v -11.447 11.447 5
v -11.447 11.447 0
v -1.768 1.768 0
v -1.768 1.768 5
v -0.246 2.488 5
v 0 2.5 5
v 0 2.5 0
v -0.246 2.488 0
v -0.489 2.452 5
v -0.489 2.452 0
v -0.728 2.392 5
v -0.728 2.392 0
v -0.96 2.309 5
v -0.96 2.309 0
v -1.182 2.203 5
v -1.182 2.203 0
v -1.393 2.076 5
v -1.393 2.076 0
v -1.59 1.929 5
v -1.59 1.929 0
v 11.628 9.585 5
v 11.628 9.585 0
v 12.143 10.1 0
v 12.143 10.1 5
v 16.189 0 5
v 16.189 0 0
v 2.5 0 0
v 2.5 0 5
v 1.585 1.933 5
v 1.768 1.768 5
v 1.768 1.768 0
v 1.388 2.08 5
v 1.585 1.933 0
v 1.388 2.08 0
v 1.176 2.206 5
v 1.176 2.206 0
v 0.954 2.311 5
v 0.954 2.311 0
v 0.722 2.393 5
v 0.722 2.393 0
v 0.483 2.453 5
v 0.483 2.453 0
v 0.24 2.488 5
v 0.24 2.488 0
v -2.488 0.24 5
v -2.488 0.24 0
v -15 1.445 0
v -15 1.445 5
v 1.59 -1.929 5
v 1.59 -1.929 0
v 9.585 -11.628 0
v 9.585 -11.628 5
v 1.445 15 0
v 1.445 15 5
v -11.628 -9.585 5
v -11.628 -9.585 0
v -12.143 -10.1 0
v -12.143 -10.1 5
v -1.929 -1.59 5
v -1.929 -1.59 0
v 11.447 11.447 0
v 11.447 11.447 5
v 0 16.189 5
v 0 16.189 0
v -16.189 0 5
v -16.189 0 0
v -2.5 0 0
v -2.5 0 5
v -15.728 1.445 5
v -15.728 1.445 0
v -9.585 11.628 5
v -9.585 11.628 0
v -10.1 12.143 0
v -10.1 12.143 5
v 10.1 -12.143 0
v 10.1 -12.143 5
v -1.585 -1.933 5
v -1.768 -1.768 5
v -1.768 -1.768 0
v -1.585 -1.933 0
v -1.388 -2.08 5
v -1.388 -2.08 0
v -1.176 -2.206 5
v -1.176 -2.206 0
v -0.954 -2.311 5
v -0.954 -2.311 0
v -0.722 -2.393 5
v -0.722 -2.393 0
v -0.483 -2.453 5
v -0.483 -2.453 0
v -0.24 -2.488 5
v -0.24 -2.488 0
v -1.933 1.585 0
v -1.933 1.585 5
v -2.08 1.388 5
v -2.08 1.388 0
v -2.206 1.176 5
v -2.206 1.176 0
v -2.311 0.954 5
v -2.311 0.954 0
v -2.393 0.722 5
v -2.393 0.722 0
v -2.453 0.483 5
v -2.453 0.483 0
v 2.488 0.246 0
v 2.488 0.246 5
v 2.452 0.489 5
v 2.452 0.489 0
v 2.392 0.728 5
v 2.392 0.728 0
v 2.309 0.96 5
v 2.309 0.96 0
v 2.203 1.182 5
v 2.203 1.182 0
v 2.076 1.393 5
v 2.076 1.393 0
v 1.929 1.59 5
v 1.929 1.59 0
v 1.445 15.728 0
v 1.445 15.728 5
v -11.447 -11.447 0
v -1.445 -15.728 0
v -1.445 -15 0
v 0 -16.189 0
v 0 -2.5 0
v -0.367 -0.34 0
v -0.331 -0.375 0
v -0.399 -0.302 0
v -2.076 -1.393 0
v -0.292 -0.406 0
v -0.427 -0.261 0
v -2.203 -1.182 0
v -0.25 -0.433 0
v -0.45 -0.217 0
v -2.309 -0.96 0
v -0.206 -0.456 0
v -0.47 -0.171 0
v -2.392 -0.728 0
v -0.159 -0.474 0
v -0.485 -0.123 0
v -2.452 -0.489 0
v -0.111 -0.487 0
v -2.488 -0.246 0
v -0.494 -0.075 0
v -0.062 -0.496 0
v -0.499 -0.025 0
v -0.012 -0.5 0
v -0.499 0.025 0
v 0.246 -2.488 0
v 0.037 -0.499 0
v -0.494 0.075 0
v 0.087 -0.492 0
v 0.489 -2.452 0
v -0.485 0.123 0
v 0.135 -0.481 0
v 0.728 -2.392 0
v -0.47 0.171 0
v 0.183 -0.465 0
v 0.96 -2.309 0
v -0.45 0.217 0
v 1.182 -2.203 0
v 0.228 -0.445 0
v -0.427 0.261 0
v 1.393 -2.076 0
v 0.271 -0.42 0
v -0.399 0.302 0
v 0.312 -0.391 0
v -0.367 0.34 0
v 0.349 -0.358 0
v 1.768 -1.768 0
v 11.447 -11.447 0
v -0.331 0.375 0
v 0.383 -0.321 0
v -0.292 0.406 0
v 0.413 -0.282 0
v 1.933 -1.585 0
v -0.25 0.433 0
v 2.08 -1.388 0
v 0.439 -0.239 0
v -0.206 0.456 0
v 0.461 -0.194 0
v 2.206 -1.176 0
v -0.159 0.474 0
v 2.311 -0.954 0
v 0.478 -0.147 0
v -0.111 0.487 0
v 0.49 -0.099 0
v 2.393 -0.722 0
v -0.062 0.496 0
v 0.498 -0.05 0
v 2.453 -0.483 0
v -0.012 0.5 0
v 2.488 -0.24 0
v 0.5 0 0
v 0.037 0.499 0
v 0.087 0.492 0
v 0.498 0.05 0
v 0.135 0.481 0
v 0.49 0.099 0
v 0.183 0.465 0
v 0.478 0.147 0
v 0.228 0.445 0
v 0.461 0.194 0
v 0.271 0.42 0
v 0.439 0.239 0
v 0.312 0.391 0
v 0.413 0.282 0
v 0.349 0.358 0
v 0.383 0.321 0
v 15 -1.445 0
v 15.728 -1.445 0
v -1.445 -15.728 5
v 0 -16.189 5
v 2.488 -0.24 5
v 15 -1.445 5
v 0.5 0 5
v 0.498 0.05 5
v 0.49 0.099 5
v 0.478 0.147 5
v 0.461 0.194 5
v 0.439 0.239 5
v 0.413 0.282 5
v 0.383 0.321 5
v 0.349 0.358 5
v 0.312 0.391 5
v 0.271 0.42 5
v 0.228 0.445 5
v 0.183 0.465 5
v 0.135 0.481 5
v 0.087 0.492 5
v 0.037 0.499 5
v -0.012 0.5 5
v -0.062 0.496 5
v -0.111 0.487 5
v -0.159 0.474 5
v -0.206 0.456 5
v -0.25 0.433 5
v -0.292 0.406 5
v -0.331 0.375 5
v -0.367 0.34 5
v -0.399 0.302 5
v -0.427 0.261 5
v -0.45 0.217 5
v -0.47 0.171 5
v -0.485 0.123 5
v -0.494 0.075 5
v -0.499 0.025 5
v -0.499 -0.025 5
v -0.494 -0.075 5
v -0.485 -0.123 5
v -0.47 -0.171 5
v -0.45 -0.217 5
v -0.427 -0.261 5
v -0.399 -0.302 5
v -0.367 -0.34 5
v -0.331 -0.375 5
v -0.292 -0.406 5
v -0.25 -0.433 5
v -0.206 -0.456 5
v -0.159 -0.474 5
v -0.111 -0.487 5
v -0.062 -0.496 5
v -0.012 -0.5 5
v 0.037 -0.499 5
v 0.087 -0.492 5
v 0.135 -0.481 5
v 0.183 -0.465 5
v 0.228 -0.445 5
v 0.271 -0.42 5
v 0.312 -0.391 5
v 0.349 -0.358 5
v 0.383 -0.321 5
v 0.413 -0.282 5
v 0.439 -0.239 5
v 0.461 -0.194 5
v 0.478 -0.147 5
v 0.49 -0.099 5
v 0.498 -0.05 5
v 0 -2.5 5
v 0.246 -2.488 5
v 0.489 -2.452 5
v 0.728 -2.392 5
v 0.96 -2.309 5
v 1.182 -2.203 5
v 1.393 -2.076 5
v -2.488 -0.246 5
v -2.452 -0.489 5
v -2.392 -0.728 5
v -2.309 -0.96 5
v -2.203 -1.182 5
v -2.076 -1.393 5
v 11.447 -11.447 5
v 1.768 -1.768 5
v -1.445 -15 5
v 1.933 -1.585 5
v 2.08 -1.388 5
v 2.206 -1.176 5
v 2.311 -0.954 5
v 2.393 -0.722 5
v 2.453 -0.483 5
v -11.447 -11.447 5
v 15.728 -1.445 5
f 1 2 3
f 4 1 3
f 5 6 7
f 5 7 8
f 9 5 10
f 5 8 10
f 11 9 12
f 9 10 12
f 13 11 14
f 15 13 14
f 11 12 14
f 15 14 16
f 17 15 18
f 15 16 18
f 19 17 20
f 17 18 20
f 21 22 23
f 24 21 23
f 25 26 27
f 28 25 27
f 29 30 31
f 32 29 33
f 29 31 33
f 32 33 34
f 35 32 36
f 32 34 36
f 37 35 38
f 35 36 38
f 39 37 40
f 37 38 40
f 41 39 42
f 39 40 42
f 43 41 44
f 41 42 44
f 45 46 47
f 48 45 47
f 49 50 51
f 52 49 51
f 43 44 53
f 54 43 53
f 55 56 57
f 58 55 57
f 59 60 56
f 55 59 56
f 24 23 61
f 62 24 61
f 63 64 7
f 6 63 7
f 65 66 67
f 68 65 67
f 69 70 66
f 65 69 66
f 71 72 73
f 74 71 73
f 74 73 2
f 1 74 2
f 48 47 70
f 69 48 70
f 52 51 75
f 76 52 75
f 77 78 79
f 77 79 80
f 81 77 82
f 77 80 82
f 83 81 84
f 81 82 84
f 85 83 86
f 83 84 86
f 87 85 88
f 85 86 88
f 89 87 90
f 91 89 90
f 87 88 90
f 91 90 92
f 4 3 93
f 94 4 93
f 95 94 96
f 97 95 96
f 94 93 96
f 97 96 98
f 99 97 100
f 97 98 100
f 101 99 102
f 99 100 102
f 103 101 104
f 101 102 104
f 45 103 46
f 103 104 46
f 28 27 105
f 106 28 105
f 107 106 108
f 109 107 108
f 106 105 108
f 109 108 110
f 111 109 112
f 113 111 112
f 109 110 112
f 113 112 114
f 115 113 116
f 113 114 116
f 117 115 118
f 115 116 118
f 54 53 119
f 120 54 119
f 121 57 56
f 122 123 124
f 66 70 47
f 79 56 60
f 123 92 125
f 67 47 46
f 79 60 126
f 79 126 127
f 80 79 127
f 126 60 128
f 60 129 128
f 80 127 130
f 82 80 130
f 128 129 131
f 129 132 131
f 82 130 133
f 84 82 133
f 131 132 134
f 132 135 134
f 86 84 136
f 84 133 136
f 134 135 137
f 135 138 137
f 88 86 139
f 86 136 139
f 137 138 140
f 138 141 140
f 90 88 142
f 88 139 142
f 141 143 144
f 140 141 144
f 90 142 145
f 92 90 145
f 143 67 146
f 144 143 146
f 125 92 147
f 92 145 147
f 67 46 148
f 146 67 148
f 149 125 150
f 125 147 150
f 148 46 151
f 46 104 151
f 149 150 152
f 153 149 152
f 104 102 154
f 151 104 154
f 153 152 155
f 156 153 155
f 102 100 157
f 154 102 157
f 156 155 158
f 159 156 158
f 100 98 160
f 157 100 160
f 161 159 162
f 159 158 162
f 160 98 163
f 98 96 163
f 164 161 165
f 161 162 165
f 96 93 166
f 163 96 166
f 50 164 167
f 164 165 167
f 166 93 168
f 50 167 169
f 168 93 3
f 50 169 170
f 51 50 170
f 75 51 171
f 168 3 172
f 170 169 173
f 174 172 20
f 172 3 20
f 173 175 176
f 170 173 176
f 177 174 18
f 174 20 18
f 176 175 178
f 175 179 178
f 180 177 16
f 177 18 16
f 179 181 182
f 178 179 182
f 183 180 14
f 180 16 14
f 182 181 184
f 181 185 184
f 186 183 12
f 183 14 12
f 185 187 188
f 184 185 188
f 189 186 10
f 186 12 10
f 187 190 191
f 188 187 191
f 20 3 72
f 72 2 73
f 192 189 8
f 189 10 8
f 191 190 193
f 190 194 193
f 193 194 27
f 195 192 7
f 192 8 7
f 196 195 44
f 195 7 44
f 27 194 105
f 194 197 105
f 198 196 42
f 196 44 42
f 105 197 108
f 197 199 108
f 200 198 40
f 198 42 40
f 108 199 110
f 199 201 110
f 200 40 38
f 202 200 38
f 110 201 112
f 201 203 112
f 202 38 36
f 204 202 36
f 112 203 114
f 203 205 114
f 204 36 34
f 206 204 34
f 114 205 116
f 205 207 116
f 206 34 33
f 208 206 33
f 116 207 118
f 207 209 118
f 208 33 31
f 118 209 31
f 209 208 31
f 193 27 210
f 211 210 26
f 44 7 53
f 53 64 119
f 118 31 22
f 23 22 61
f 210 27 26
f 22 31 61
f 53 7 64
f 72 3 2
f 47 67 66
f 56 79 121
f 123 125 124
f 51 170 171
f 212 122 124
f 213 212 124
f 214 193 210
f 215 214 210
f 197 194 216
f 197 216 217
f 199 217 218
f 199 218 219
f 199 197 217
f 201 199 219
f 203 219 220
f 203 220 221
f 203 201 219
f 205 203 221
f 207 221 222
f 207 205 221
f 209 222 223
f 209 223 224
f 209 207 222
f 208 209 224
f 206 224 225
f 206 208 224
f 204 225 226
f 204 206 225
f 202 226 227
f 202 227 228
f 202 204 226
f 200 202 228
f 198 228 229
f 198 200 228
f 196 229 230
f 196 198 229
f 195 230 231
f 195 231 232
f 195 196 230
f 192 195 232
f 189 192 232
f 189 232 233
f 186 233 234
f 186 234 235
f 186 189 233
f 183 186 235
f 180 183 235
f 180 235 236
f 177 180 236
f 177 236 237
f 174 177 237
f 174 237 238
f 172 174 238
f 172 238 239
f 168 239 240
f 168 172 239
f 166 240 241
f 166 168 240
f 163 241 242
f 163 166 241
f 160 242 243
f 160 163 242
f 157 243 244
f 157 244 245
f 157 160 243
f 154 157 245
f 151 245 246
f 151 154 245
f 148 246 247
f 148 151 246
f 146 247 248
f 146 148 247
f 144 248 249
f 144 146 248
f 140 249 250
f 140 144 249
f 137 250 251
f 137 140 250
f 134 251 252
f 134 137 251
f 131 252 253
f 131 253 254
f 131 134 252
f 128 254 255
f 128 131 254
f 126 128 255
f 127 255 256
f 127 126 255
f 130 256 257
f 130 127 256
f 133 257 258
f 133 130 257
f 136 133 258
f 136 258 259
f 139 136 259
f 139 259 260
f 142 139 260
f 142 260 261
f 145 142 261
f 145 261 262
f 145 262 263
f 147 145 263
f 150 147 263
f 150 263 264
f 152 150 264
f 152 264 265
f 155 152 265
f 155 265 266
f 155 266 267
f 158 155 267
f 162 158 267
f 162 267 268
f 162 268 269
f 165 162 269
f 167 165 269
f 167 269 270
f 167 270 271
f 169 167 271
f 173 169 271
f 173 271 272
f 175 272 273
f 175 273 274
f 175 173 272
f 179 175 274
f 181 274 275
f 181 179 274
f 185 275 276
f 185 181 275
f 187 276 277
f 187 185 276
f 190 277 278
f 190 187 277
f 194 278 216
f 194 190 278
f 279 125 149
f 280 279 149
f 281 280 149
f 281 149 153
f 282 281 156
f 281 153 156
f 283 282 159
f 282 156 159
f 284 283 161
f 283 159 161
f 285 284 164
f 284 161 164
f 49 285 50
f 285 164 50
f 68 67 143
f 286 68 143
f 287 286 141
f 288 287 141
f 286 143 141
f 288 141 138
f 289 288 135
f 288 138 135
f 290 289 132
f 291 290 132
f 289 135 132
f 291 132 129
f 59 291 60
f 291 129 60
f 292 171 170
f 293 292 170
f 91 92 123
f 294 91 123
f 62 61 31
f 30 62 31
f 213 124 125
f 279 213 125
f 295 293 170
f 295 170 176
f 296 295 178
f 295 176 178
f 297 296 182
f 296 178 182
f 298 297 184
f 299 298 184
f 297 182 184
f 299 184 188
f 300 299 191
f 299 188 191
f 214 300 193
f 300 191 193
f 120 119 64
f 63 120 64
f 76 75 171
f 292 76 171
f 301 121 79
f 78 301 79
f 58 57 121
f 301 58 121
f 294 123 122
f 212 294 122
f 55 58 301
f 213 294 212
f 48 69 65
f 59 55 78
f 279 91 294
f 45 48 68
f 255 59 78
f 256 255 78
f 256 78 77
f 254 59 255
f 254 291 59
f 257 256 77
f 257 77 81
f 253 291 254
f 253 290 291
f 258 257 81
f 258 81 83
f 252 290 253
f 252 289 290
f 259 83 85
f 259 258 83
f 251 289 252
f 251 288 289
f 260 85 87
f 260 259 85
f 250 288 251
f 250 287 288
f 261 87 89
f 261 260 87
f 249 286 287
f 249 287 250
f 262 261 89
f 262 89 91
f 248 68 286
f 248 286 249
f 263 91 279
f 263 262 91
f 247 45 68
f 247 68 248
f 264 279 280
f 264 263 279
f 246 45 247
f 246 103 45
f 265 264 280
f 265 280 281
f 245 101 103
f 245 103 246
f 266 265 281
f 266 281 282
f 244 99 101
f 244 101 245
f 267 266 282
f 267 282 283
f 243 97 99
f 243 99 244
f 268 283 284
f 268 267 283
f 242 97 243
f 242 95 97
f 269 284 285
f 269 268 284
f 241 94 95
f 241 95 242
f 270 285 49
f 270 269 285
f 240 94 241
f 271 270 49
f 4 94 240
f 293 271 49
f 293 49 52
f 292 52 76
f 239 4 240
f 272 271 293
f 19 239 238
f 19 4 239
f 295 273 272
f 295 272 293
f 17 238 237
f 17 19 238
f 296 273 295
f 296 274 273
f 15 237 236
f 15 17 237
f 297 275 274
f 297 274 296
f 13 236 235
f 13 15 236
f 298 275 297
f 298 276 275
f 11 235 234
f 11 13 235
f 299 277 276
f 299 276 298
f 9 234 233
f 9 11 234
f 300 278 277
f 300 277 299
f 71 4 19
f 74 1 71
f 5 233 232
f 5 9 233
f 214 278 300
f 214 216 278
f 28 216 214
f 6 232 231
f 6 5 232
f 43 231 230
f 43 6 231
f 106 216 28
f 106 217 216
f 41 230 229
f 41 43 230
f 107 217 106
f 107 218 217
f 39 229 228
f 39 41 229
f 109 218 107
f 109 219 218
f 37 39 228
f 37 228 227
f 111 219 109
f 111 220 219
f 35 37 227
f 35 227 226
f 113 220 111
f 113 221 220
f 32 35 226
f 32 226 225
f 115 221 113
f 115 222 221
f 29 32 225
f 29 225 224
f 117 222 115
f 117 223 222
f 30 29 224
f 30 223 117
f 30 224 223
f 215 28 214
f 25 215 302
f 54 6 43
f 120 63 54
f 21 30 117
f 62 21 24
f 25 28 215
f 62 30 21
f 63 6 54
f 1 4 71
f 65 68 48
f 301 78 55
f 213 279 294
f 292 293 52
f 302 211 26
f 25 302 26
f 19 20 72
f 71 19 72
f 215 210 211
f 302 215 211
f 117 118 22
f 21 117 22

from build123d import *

# Parameters (mm, degrees)
F0_R     = 2.5
F0_R_2   = 0.5
F1_DEPTH = 5
F3_DEPTH = 5


with BuildPart() as f1:
    # F0 (on Top) → F1 (new body)
    with BuildSketch(Plane.XY):
        Circle(F0_R)
        Circle(F0_R_2, mode=Mode.SUBTRACT)
    extrude(amount=F1_DEPTH)

    # F2 (on Top) → F3 (join)
    with BuildSketch(Plane.XY):
        with BuildLine():
            ThreePointArc((-0.981539, 0.981539), (-0.933303, 1.027514), (-0.882916, 1.07112))
            Line((-0.882916, 1.07112), (-9.58502, 11.628184))
            Line((-9.58502, 11.628184), (-10.099932, 12.143096))
            Line((-10.099932, 12.143096), (-11.447009, 11.447009))
            Line((-11.447009, 11.447009), (-10.606602, 10.606602))
            Line((-10.606602, 10.606602), (-0.981539, 0.981539))
        make_face()
        with BuildLine():
            Line((0, 15), (0, 1.388106))
            ThreePointArc((0, 1.388106), (0.066617, 1.386507), (0.133081, 1.381712))
            Line((0.133081, 1.381712), (1.444735, 15))
            Line((1.444735, 15), (1.444735, 15.728196))
            Line((1.444735, 15.728196), (0, 16.188515))
            Line((0, 16.188515), (0, 15))
        make_face()
        with BuildLine():
            Line((10.606602, 10.606602), (0.981539, 0.981539))
            ThreePointArc((0.981539, 0.981539), (1.027514, 0.933303), (1.07112, 0.882916))
            Line((1.07112, 0.882916), (11.628184, 9.58502))
            Line((11.628184, 9.58502), (12.143096, 10.099932))
            Line((12.143096, 10.099932), (11.447009, 11.447009))
            Line((11.447009, 11.447009), (10.606602, 10.606602))
        make_face()
        with BuildLine():
            Line((15, 0), (1.388106, 0))
            ThreePointArc((1.388106, 0), (1.386507, -0.066617), (1.381712, -0.133081))
            Line((1.381712, -0.133081), (15, -1.444735))
            Line((15, -1.444735), (15.728196, -1.444735))
            Line((15.728196, -1.444735), (16.188515, 0))
            Line((16.188515, 0), (15, 0))
        make_face()
        with BuildLine():
            Line((10.606602, -10.606602), (0.981539, -0.981539))
            ThreePointArc((0.981539, -0.981539), (0.933303, -1.027514), (0.882916, -1.07112))
            Line((0.882916, -1.07112), (9.58502, -11.628184))
            Line((9.58502, -11.628184), (10.099932, -12.143096))
            Line((10.099932, -12.143096), (11.447009, -11.447009))
            Line((11.447009, -11.447009), (10.606602, -10.606602))
        make_face()
        with BuildLine():
            ThreePointArc((0, -1.388106), (-0.066617, -1.386507), (-0.133081, -1.381712))
            Line((-0.133081, -1.381712), (-1.444735, -15))
            Line((-1.444735, -15), (-1.444735, -15.728196))
            Line((-1.444735, -15.728196), (0, -16.188515))
            Line((0, -16.188515), (0, -15))
            Line((0, -15), (0, -1.388106))
        make_face()
        with BuildLine():
            ThreePointArc((-0.981539, -0.981539), (-1.027514, -0.933303), (-1.07112, -0.882916))
            Line((-1.07112, -0.882916), (-11.628184, -9.58502))
            Line((-11.628184, -9.58502), (-12.143096, -10.099932))
            Line((-12.143096, -10.099932), (-11.447009, -11.447009))
            Line((-11.447009, -11.447009), (-10.606602, -10.606602))
            Line((-10.606602, -10.606602), (-0.981539, -0.981539))
        make_face()
        with BuildLine():
            ThreePointArc((-1.388106, 0), (-1.386507, 0.066617), (-1.381712, 0.133081))
            Line((-1.381712, 0.133081), (-15, 1.444735))
            Line((-15, 1.444735), (-15.728196, 1.444735))
            Line((-15.728196, 1.444735), (-16.188515, 0))
            Line((-16.188515, 0), (-15, 0))
            Line((-15, 0), (-1.388106, 0))
        make_face()
    extrude(amount=F3_DEPTH)


solid = f1.part
